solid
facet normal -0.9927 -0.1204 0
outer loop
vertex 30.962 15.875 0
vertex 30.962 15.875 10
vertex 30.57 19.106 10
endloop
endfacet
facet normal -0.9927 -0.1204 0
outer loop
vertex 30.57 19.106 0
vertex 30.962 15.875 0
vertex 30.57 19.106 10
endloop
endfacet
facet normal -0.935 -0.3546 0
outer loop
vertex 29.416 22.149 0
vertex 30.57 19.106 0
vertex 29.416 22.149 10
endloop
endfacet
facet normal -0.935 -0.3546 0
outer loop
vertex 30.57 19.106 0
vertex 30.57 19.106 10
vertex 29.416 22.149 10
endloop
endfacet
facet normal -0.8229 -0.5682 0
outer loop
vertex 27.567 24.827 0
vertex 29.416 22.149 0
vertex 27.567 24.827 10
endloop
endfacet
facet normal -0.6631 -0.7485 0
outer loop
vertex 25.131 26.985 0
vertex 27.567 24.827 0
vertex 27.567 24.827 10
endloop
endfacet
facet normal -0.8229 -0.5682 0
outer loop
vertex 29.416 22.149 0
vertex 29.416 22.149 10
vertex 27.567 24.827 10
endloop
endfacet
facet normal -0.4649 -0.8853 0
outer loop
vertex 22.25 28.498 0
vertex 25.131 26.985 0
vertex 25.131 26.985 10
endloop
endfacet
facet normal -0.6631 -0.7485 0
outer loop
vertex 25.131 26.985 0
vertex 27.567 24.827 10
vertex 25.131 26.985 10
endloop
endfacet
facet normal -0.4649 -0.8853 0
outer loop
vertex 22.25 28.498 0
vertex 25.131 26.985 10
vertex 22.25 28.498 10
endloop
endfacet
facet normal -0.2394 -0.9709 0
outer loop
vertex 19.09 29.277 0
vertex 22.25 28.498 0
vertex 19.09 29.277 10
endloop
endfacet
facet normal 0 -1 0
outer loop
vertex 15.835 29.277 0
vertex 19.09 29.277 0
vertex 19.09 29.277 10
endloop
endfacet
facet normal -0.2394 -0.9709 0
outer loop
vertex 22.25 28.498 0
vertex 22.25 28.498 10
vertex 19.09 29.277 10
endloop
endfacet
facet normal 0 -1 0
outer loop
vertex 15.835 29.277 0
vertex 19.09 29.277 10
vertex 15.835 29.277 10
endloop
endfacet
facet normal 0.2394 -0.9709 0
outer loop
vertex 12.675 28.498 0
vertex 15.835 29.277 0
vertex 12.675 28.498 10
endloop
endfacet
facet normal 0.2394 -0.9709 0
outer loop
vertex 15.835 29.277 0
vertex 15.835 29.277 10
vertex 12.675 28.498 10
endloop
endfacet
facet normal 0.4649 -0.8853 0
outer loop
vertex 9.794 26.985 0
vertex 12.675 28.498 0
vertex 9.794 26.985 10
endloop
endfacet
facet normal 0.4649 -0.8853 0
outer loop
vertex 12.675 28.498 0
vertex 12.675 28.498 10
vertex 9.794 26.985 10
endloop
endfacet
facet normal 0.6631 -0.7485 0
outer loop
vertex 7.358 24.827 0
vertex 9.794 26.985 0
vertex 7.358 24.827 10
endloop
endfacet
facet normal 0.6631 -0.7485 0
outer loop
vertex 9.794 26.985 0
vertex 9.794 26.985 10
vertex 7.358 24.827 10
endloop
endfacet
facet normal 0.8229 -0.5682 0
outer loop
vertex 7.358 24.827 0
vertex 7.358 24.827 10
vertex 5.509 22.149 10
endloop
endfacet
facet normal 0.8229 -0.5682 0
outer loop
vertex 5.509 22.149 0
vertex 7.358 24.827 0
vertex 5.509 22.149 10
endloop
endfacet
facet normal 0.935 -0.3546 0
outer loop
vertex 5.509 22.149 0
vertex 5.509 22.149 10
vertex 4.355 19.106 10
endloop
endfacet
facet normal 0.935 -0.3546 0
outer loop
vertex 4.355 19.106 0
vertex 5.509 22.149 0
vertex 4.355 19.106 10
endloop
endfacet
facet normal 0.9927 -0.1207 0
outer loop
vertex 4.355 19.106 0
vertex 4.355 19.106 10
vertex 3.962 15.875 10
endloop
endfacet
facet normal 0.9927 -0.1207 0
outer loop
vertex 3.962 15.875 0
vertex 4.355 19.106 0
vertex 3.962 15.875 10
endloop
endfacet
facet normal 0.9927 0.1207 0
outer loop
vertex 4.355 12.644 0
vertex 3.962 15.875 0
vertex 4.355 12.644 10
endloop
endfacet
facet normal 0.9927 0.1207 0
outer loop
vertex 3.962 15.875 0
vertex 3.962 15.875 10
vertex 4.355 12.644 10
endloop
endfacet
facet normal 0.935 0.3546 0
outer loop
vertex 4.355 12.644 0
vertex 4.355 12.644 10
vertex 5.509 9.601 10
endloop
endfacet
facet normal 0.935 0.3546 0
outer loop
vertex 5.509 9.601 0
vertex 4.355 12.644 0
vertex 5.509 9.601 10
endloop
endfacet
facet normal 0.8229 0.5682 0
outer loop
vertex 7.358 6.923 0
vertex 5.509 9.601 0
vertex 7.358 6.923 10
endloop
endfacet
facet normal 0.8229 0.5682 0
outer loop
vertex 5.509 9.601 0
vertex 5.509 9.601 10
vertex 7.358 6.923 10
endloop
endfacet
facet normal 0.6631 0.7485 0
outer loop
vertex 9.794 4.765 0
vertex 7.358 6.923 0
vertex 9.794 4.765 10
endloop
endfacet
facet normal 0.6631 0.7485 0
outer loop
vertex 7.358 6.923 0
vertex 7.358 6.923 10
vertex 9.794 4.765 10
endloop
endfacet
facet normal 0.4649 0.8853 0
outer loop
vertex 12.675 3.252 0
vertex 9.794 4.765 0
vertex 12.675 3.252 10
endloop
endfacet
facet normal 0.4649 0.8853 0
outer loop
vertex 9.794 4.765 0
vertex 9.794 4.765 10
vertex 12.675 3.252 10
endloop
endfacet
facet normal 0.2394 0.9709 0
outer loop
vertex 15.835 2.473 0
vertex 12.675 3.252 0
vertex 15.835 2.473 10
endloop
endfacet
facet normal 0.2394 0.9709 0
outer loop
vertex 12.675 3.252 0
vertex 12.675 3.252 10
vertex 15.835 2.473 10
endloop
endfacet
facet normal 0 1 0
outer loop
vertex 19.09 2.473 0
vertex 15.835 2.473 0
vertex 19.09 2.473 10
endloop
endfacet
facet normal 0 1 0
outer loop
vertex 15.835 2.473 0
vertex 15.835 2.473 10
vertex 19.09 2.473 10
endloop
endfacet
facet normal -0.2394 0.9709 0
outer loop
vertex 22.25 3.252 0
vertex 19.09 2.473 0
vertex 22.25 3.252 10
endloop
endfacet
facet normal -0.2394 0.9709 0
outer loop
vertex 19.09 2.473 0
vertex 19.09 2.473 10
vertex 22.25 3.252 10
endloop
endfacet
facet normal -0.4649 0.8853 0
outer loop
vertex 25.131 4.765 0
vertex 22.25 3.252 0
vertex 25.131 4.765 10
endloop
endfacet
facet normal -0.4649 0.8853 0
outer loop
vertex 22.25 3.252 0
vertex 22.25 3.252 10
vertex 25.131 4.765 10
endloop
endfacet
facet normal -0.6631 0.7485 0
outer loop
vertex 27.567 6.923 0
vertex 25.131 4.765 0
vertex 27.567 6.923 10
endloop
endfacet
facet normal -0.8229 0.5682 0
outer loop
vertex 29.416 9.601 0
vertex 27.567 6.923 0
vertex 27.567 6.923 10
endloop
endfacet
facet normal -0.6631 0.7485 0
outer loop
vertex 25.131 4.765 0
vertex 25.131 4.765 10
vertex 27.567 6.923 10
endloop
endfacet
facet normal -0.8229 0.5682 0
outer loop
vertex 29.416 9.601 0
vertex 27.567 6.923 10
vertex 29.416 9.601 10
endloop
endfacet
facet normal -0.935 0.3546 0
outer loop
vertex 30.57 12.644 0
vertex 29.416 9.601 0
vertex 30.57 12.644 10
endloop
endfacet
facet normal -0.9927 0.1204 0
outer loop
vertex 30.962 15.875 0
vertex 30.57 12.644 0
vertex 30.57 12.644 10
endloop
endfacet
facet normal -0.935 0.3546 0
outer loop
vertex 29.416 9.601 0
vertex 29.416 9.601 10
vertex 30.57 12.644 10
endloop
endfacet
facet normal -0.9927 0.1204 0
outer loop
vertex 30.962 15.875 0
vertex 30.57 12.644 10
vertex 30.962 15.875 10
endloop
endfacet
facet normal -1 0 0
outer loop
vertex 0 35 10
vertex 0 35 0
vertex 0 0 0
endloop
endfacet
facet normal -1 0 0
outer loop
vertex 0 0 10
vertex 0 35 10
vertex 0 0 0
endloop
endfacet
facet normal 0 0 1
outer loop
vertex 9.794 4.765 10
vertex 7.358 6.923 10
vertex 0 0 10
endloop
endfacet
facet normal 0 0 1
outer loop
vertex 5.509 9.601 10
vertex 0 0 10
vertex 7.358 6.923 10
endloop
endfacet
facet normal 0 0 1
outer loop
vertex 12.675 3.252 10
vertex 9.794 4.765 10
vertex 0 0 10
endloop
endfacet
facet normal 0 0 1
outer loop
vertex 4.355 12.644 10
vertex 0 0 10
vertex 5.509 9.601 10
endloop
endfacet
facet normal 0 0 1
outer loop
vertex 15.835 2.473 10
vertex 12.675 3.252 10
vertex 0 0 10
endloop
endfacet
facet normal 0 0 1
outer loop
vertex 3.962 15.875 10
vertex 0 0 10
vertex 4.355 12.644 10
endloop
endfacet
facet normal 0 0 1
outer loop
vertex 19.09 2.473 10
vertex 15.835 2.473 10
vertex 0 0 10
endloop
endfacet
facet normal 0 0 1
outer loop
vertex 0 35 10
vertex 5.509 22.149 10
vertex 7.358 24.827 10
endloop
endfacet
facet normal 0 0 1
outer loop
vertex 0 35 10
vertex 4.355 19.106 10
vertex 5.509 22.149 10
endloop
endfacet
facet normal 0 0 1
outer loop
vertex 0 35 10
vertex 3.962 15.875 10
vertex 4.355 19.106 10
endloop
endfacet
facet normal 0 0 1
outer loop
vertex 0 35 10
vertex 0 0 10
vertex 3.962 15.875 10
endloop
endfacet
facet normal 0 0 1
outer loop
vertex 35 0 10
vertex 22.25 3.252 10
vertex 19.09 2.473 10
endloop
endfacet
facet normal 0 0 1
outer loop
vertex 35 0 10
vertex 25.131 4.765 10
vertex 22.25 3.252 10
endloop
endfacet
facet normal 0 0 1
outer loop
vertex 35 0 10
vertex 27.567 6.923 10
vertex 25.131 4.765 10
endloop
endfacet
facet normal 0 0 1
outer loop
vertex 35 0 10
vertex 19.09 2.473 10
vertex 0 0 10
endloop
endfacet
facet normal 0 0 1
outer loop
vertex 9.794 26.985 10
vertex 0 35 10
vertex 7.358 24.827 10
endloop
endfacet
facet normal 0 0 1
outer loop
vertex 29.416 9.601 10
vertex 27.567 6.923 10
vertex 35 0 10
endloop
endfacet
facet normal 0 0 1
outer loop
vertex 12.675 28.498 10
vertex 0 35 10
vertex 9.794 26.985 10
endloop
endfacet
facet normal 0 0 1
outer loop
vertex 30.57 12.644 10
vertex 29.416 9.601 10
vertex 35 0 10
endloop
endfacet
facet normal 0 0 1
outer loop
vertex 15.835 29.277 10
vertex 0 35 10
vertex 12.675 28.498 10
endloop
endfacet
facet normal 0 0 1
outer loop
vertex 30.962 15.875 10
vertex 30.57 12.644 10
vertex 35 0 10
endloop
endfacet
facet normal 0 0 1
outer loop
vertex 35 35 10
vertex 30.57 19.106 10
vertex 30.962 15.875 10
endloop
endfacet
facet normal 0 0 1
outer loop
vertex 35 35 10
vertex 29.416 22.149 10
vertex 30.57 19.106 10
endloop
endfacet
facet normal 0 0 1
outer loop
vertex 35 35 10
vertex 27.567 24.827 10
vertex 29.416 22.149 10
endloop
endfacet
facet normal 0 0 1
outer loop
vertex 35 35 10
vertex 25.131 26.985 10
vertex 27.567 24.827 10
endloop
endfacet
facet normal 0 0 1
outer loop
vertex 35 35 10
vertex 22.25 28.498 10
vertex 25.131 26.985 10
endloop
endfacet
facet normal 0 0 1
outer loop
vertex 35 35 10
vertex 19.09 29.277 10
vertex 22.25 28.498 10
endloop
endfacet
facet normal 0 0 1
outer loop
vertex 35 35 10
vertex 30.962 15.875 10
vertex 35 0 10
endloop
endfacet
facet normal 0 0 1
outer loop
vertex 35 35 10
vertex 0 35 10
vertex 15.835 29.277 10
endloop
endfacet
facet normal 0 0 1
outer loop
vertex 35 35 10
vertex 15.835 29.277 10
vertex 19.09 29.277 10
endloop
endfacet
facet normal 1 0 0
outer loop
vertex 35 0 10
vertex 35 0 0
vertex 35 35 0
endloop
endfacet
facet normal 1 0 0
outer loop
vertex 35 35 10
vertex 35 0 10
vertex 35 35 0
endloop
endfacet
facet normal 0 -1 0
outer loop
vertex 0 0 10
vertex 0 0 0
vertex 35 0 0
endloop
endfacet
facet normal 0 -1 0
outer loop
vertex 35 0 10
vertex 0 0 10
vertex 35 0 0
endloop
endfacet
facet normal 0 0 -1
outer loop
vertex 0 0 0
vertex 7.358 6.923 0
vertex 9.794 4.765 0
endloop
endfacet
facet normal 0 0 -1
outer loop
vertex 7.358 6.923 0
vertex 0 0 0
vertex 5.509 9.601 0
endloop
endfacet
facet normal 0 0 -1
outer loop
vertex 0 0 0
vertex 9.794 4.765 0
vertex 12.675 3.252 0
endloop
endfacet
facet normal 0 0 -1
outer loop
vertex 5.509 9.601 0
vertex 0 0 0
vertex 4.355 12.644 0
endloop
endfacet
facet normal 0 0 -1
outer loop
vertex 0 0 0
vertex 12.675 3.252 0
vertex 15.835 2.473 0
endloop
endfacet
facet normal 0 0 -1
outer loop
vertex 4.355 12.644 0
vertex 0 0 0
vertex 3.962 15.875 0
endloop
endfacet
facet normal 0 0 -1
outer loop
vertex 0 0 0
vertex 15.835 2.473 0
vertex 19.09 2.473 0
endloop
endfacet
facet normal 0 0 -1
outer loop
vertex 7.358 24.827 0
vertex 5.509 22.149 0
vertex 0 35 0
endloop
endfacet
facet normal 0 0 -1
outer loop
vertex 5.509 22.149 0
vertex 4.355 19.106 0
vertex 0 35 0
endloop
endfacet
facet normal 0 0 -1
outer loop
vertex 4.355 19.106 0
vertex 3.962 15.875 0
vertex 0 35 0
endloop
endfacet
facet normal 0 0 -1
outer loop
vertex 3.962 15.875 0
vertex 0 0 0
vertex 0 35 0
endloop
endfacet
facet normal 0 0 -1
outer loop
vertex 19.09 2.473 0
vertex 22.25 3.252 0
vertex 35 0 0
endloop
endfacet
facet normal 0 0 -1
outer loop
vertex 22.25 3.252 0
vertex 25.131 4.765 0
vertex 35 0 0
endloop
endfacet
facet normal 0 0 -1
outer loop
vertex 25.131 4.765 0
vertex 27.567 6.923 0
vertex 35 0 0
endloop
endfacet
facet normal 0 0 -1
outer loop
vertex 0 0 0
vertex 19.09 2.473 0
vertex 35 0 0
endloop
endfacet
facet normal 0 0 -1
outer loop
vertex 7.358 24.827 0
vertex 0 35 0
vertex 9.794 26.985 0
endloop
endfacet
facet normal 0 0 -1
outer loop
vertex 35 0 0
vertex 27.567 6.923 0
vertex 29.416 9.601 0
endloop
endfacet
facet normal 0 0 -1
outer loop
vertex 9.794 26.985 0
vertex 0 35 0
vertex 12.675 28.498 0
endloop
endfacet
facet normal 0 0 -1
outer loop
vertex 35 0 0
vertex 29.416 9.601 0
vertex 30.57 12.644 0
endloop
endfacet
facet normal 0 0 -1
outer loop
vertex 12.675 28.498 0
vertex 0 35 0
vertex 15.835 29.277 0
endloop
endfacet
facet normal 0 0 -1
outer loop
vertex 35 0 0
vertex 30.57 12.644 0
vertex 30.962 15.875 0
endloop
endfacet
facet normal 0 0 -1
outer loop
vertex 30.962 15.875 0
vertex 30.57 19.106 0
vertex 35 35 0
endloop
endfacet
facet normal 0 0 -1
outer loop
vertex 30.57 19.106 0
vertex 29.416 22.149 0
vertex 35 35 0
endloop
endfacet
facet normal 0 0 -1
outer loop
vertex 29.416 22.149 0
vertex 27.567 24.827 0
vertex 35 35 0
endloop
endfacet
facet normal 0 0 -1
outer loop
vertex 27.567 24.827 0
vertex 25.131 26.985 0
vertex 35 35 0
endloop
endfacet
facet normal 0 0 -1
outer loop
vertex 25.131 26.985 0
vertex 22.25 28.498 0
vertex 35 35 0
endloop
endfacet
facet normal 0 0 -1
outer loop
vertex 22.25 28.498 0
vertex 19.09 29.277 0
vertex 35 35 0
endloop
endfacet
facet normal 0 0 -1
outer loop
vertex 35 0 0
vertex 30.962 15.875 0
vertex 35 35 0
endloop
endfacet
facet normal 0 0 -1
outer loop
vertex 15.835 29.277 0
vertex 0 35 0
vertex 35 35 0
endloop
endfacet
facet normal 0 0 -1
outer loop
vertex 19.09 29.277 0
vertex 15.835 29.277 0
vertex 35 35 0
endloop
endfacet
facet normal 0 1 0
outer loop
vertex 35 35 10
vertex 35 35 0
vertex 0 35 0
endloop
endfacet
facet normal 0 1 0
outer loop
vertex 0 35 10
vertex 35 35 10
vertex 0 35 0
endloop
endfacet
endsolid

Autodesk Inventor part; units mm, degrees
ref_plane "YZ Plane" through (0, 0, 0) normal (1, 0, 0) x (0, 1, 0)
ref_plane "XZ Plane" through (0, 0, 0) normal (0, 1, 0) x (-1, 0, 0)
ref_plane "XY Plane" through (0, 0, 0) normal (0, 0, 1) x (1, 0, 0)
sketch "Sketch1" plane through (0, 0, 0) normal (0, 0, 1) x (1, 0, 0)
  line L0 (0, 0) -> (35, 0)
  line L1 (35, 0) -> (35, 35)
  line L2 (35, 35) -> (0, 35)
  line L3 (0, 35) -> (0, 0)
  line L4 (17.5, 35) -> (17.5, 0)
  line L5 (0, 17.5) -> (35, 17.5)
  dimension "d0" = 35
  dimension "d1" = 35
extrude "Extrusion1" add sketch "Sketch1" along normal blind 10
sketch "Sketch2" plane through (0, 0, 10) normal (0, 0, 1) x (1, 0, 0)
  point P0 (0, 0)
sketch "Sketch3" plane through (0, 0, 10) normal (0, 0, 1) x (1, 0, 0)
  circle A0 centre (17.4625, 15.875) radius 13.5
  point P0 (0, 0)
  dimension "d4" = 27
extrude "Extrusion2" cut sketch "Sketch3" against normal through all
thread "Thread1" size "M27x3" class "6H" standard "ANSI Metric M Profile" full length
properties part number "dc motor nut"
